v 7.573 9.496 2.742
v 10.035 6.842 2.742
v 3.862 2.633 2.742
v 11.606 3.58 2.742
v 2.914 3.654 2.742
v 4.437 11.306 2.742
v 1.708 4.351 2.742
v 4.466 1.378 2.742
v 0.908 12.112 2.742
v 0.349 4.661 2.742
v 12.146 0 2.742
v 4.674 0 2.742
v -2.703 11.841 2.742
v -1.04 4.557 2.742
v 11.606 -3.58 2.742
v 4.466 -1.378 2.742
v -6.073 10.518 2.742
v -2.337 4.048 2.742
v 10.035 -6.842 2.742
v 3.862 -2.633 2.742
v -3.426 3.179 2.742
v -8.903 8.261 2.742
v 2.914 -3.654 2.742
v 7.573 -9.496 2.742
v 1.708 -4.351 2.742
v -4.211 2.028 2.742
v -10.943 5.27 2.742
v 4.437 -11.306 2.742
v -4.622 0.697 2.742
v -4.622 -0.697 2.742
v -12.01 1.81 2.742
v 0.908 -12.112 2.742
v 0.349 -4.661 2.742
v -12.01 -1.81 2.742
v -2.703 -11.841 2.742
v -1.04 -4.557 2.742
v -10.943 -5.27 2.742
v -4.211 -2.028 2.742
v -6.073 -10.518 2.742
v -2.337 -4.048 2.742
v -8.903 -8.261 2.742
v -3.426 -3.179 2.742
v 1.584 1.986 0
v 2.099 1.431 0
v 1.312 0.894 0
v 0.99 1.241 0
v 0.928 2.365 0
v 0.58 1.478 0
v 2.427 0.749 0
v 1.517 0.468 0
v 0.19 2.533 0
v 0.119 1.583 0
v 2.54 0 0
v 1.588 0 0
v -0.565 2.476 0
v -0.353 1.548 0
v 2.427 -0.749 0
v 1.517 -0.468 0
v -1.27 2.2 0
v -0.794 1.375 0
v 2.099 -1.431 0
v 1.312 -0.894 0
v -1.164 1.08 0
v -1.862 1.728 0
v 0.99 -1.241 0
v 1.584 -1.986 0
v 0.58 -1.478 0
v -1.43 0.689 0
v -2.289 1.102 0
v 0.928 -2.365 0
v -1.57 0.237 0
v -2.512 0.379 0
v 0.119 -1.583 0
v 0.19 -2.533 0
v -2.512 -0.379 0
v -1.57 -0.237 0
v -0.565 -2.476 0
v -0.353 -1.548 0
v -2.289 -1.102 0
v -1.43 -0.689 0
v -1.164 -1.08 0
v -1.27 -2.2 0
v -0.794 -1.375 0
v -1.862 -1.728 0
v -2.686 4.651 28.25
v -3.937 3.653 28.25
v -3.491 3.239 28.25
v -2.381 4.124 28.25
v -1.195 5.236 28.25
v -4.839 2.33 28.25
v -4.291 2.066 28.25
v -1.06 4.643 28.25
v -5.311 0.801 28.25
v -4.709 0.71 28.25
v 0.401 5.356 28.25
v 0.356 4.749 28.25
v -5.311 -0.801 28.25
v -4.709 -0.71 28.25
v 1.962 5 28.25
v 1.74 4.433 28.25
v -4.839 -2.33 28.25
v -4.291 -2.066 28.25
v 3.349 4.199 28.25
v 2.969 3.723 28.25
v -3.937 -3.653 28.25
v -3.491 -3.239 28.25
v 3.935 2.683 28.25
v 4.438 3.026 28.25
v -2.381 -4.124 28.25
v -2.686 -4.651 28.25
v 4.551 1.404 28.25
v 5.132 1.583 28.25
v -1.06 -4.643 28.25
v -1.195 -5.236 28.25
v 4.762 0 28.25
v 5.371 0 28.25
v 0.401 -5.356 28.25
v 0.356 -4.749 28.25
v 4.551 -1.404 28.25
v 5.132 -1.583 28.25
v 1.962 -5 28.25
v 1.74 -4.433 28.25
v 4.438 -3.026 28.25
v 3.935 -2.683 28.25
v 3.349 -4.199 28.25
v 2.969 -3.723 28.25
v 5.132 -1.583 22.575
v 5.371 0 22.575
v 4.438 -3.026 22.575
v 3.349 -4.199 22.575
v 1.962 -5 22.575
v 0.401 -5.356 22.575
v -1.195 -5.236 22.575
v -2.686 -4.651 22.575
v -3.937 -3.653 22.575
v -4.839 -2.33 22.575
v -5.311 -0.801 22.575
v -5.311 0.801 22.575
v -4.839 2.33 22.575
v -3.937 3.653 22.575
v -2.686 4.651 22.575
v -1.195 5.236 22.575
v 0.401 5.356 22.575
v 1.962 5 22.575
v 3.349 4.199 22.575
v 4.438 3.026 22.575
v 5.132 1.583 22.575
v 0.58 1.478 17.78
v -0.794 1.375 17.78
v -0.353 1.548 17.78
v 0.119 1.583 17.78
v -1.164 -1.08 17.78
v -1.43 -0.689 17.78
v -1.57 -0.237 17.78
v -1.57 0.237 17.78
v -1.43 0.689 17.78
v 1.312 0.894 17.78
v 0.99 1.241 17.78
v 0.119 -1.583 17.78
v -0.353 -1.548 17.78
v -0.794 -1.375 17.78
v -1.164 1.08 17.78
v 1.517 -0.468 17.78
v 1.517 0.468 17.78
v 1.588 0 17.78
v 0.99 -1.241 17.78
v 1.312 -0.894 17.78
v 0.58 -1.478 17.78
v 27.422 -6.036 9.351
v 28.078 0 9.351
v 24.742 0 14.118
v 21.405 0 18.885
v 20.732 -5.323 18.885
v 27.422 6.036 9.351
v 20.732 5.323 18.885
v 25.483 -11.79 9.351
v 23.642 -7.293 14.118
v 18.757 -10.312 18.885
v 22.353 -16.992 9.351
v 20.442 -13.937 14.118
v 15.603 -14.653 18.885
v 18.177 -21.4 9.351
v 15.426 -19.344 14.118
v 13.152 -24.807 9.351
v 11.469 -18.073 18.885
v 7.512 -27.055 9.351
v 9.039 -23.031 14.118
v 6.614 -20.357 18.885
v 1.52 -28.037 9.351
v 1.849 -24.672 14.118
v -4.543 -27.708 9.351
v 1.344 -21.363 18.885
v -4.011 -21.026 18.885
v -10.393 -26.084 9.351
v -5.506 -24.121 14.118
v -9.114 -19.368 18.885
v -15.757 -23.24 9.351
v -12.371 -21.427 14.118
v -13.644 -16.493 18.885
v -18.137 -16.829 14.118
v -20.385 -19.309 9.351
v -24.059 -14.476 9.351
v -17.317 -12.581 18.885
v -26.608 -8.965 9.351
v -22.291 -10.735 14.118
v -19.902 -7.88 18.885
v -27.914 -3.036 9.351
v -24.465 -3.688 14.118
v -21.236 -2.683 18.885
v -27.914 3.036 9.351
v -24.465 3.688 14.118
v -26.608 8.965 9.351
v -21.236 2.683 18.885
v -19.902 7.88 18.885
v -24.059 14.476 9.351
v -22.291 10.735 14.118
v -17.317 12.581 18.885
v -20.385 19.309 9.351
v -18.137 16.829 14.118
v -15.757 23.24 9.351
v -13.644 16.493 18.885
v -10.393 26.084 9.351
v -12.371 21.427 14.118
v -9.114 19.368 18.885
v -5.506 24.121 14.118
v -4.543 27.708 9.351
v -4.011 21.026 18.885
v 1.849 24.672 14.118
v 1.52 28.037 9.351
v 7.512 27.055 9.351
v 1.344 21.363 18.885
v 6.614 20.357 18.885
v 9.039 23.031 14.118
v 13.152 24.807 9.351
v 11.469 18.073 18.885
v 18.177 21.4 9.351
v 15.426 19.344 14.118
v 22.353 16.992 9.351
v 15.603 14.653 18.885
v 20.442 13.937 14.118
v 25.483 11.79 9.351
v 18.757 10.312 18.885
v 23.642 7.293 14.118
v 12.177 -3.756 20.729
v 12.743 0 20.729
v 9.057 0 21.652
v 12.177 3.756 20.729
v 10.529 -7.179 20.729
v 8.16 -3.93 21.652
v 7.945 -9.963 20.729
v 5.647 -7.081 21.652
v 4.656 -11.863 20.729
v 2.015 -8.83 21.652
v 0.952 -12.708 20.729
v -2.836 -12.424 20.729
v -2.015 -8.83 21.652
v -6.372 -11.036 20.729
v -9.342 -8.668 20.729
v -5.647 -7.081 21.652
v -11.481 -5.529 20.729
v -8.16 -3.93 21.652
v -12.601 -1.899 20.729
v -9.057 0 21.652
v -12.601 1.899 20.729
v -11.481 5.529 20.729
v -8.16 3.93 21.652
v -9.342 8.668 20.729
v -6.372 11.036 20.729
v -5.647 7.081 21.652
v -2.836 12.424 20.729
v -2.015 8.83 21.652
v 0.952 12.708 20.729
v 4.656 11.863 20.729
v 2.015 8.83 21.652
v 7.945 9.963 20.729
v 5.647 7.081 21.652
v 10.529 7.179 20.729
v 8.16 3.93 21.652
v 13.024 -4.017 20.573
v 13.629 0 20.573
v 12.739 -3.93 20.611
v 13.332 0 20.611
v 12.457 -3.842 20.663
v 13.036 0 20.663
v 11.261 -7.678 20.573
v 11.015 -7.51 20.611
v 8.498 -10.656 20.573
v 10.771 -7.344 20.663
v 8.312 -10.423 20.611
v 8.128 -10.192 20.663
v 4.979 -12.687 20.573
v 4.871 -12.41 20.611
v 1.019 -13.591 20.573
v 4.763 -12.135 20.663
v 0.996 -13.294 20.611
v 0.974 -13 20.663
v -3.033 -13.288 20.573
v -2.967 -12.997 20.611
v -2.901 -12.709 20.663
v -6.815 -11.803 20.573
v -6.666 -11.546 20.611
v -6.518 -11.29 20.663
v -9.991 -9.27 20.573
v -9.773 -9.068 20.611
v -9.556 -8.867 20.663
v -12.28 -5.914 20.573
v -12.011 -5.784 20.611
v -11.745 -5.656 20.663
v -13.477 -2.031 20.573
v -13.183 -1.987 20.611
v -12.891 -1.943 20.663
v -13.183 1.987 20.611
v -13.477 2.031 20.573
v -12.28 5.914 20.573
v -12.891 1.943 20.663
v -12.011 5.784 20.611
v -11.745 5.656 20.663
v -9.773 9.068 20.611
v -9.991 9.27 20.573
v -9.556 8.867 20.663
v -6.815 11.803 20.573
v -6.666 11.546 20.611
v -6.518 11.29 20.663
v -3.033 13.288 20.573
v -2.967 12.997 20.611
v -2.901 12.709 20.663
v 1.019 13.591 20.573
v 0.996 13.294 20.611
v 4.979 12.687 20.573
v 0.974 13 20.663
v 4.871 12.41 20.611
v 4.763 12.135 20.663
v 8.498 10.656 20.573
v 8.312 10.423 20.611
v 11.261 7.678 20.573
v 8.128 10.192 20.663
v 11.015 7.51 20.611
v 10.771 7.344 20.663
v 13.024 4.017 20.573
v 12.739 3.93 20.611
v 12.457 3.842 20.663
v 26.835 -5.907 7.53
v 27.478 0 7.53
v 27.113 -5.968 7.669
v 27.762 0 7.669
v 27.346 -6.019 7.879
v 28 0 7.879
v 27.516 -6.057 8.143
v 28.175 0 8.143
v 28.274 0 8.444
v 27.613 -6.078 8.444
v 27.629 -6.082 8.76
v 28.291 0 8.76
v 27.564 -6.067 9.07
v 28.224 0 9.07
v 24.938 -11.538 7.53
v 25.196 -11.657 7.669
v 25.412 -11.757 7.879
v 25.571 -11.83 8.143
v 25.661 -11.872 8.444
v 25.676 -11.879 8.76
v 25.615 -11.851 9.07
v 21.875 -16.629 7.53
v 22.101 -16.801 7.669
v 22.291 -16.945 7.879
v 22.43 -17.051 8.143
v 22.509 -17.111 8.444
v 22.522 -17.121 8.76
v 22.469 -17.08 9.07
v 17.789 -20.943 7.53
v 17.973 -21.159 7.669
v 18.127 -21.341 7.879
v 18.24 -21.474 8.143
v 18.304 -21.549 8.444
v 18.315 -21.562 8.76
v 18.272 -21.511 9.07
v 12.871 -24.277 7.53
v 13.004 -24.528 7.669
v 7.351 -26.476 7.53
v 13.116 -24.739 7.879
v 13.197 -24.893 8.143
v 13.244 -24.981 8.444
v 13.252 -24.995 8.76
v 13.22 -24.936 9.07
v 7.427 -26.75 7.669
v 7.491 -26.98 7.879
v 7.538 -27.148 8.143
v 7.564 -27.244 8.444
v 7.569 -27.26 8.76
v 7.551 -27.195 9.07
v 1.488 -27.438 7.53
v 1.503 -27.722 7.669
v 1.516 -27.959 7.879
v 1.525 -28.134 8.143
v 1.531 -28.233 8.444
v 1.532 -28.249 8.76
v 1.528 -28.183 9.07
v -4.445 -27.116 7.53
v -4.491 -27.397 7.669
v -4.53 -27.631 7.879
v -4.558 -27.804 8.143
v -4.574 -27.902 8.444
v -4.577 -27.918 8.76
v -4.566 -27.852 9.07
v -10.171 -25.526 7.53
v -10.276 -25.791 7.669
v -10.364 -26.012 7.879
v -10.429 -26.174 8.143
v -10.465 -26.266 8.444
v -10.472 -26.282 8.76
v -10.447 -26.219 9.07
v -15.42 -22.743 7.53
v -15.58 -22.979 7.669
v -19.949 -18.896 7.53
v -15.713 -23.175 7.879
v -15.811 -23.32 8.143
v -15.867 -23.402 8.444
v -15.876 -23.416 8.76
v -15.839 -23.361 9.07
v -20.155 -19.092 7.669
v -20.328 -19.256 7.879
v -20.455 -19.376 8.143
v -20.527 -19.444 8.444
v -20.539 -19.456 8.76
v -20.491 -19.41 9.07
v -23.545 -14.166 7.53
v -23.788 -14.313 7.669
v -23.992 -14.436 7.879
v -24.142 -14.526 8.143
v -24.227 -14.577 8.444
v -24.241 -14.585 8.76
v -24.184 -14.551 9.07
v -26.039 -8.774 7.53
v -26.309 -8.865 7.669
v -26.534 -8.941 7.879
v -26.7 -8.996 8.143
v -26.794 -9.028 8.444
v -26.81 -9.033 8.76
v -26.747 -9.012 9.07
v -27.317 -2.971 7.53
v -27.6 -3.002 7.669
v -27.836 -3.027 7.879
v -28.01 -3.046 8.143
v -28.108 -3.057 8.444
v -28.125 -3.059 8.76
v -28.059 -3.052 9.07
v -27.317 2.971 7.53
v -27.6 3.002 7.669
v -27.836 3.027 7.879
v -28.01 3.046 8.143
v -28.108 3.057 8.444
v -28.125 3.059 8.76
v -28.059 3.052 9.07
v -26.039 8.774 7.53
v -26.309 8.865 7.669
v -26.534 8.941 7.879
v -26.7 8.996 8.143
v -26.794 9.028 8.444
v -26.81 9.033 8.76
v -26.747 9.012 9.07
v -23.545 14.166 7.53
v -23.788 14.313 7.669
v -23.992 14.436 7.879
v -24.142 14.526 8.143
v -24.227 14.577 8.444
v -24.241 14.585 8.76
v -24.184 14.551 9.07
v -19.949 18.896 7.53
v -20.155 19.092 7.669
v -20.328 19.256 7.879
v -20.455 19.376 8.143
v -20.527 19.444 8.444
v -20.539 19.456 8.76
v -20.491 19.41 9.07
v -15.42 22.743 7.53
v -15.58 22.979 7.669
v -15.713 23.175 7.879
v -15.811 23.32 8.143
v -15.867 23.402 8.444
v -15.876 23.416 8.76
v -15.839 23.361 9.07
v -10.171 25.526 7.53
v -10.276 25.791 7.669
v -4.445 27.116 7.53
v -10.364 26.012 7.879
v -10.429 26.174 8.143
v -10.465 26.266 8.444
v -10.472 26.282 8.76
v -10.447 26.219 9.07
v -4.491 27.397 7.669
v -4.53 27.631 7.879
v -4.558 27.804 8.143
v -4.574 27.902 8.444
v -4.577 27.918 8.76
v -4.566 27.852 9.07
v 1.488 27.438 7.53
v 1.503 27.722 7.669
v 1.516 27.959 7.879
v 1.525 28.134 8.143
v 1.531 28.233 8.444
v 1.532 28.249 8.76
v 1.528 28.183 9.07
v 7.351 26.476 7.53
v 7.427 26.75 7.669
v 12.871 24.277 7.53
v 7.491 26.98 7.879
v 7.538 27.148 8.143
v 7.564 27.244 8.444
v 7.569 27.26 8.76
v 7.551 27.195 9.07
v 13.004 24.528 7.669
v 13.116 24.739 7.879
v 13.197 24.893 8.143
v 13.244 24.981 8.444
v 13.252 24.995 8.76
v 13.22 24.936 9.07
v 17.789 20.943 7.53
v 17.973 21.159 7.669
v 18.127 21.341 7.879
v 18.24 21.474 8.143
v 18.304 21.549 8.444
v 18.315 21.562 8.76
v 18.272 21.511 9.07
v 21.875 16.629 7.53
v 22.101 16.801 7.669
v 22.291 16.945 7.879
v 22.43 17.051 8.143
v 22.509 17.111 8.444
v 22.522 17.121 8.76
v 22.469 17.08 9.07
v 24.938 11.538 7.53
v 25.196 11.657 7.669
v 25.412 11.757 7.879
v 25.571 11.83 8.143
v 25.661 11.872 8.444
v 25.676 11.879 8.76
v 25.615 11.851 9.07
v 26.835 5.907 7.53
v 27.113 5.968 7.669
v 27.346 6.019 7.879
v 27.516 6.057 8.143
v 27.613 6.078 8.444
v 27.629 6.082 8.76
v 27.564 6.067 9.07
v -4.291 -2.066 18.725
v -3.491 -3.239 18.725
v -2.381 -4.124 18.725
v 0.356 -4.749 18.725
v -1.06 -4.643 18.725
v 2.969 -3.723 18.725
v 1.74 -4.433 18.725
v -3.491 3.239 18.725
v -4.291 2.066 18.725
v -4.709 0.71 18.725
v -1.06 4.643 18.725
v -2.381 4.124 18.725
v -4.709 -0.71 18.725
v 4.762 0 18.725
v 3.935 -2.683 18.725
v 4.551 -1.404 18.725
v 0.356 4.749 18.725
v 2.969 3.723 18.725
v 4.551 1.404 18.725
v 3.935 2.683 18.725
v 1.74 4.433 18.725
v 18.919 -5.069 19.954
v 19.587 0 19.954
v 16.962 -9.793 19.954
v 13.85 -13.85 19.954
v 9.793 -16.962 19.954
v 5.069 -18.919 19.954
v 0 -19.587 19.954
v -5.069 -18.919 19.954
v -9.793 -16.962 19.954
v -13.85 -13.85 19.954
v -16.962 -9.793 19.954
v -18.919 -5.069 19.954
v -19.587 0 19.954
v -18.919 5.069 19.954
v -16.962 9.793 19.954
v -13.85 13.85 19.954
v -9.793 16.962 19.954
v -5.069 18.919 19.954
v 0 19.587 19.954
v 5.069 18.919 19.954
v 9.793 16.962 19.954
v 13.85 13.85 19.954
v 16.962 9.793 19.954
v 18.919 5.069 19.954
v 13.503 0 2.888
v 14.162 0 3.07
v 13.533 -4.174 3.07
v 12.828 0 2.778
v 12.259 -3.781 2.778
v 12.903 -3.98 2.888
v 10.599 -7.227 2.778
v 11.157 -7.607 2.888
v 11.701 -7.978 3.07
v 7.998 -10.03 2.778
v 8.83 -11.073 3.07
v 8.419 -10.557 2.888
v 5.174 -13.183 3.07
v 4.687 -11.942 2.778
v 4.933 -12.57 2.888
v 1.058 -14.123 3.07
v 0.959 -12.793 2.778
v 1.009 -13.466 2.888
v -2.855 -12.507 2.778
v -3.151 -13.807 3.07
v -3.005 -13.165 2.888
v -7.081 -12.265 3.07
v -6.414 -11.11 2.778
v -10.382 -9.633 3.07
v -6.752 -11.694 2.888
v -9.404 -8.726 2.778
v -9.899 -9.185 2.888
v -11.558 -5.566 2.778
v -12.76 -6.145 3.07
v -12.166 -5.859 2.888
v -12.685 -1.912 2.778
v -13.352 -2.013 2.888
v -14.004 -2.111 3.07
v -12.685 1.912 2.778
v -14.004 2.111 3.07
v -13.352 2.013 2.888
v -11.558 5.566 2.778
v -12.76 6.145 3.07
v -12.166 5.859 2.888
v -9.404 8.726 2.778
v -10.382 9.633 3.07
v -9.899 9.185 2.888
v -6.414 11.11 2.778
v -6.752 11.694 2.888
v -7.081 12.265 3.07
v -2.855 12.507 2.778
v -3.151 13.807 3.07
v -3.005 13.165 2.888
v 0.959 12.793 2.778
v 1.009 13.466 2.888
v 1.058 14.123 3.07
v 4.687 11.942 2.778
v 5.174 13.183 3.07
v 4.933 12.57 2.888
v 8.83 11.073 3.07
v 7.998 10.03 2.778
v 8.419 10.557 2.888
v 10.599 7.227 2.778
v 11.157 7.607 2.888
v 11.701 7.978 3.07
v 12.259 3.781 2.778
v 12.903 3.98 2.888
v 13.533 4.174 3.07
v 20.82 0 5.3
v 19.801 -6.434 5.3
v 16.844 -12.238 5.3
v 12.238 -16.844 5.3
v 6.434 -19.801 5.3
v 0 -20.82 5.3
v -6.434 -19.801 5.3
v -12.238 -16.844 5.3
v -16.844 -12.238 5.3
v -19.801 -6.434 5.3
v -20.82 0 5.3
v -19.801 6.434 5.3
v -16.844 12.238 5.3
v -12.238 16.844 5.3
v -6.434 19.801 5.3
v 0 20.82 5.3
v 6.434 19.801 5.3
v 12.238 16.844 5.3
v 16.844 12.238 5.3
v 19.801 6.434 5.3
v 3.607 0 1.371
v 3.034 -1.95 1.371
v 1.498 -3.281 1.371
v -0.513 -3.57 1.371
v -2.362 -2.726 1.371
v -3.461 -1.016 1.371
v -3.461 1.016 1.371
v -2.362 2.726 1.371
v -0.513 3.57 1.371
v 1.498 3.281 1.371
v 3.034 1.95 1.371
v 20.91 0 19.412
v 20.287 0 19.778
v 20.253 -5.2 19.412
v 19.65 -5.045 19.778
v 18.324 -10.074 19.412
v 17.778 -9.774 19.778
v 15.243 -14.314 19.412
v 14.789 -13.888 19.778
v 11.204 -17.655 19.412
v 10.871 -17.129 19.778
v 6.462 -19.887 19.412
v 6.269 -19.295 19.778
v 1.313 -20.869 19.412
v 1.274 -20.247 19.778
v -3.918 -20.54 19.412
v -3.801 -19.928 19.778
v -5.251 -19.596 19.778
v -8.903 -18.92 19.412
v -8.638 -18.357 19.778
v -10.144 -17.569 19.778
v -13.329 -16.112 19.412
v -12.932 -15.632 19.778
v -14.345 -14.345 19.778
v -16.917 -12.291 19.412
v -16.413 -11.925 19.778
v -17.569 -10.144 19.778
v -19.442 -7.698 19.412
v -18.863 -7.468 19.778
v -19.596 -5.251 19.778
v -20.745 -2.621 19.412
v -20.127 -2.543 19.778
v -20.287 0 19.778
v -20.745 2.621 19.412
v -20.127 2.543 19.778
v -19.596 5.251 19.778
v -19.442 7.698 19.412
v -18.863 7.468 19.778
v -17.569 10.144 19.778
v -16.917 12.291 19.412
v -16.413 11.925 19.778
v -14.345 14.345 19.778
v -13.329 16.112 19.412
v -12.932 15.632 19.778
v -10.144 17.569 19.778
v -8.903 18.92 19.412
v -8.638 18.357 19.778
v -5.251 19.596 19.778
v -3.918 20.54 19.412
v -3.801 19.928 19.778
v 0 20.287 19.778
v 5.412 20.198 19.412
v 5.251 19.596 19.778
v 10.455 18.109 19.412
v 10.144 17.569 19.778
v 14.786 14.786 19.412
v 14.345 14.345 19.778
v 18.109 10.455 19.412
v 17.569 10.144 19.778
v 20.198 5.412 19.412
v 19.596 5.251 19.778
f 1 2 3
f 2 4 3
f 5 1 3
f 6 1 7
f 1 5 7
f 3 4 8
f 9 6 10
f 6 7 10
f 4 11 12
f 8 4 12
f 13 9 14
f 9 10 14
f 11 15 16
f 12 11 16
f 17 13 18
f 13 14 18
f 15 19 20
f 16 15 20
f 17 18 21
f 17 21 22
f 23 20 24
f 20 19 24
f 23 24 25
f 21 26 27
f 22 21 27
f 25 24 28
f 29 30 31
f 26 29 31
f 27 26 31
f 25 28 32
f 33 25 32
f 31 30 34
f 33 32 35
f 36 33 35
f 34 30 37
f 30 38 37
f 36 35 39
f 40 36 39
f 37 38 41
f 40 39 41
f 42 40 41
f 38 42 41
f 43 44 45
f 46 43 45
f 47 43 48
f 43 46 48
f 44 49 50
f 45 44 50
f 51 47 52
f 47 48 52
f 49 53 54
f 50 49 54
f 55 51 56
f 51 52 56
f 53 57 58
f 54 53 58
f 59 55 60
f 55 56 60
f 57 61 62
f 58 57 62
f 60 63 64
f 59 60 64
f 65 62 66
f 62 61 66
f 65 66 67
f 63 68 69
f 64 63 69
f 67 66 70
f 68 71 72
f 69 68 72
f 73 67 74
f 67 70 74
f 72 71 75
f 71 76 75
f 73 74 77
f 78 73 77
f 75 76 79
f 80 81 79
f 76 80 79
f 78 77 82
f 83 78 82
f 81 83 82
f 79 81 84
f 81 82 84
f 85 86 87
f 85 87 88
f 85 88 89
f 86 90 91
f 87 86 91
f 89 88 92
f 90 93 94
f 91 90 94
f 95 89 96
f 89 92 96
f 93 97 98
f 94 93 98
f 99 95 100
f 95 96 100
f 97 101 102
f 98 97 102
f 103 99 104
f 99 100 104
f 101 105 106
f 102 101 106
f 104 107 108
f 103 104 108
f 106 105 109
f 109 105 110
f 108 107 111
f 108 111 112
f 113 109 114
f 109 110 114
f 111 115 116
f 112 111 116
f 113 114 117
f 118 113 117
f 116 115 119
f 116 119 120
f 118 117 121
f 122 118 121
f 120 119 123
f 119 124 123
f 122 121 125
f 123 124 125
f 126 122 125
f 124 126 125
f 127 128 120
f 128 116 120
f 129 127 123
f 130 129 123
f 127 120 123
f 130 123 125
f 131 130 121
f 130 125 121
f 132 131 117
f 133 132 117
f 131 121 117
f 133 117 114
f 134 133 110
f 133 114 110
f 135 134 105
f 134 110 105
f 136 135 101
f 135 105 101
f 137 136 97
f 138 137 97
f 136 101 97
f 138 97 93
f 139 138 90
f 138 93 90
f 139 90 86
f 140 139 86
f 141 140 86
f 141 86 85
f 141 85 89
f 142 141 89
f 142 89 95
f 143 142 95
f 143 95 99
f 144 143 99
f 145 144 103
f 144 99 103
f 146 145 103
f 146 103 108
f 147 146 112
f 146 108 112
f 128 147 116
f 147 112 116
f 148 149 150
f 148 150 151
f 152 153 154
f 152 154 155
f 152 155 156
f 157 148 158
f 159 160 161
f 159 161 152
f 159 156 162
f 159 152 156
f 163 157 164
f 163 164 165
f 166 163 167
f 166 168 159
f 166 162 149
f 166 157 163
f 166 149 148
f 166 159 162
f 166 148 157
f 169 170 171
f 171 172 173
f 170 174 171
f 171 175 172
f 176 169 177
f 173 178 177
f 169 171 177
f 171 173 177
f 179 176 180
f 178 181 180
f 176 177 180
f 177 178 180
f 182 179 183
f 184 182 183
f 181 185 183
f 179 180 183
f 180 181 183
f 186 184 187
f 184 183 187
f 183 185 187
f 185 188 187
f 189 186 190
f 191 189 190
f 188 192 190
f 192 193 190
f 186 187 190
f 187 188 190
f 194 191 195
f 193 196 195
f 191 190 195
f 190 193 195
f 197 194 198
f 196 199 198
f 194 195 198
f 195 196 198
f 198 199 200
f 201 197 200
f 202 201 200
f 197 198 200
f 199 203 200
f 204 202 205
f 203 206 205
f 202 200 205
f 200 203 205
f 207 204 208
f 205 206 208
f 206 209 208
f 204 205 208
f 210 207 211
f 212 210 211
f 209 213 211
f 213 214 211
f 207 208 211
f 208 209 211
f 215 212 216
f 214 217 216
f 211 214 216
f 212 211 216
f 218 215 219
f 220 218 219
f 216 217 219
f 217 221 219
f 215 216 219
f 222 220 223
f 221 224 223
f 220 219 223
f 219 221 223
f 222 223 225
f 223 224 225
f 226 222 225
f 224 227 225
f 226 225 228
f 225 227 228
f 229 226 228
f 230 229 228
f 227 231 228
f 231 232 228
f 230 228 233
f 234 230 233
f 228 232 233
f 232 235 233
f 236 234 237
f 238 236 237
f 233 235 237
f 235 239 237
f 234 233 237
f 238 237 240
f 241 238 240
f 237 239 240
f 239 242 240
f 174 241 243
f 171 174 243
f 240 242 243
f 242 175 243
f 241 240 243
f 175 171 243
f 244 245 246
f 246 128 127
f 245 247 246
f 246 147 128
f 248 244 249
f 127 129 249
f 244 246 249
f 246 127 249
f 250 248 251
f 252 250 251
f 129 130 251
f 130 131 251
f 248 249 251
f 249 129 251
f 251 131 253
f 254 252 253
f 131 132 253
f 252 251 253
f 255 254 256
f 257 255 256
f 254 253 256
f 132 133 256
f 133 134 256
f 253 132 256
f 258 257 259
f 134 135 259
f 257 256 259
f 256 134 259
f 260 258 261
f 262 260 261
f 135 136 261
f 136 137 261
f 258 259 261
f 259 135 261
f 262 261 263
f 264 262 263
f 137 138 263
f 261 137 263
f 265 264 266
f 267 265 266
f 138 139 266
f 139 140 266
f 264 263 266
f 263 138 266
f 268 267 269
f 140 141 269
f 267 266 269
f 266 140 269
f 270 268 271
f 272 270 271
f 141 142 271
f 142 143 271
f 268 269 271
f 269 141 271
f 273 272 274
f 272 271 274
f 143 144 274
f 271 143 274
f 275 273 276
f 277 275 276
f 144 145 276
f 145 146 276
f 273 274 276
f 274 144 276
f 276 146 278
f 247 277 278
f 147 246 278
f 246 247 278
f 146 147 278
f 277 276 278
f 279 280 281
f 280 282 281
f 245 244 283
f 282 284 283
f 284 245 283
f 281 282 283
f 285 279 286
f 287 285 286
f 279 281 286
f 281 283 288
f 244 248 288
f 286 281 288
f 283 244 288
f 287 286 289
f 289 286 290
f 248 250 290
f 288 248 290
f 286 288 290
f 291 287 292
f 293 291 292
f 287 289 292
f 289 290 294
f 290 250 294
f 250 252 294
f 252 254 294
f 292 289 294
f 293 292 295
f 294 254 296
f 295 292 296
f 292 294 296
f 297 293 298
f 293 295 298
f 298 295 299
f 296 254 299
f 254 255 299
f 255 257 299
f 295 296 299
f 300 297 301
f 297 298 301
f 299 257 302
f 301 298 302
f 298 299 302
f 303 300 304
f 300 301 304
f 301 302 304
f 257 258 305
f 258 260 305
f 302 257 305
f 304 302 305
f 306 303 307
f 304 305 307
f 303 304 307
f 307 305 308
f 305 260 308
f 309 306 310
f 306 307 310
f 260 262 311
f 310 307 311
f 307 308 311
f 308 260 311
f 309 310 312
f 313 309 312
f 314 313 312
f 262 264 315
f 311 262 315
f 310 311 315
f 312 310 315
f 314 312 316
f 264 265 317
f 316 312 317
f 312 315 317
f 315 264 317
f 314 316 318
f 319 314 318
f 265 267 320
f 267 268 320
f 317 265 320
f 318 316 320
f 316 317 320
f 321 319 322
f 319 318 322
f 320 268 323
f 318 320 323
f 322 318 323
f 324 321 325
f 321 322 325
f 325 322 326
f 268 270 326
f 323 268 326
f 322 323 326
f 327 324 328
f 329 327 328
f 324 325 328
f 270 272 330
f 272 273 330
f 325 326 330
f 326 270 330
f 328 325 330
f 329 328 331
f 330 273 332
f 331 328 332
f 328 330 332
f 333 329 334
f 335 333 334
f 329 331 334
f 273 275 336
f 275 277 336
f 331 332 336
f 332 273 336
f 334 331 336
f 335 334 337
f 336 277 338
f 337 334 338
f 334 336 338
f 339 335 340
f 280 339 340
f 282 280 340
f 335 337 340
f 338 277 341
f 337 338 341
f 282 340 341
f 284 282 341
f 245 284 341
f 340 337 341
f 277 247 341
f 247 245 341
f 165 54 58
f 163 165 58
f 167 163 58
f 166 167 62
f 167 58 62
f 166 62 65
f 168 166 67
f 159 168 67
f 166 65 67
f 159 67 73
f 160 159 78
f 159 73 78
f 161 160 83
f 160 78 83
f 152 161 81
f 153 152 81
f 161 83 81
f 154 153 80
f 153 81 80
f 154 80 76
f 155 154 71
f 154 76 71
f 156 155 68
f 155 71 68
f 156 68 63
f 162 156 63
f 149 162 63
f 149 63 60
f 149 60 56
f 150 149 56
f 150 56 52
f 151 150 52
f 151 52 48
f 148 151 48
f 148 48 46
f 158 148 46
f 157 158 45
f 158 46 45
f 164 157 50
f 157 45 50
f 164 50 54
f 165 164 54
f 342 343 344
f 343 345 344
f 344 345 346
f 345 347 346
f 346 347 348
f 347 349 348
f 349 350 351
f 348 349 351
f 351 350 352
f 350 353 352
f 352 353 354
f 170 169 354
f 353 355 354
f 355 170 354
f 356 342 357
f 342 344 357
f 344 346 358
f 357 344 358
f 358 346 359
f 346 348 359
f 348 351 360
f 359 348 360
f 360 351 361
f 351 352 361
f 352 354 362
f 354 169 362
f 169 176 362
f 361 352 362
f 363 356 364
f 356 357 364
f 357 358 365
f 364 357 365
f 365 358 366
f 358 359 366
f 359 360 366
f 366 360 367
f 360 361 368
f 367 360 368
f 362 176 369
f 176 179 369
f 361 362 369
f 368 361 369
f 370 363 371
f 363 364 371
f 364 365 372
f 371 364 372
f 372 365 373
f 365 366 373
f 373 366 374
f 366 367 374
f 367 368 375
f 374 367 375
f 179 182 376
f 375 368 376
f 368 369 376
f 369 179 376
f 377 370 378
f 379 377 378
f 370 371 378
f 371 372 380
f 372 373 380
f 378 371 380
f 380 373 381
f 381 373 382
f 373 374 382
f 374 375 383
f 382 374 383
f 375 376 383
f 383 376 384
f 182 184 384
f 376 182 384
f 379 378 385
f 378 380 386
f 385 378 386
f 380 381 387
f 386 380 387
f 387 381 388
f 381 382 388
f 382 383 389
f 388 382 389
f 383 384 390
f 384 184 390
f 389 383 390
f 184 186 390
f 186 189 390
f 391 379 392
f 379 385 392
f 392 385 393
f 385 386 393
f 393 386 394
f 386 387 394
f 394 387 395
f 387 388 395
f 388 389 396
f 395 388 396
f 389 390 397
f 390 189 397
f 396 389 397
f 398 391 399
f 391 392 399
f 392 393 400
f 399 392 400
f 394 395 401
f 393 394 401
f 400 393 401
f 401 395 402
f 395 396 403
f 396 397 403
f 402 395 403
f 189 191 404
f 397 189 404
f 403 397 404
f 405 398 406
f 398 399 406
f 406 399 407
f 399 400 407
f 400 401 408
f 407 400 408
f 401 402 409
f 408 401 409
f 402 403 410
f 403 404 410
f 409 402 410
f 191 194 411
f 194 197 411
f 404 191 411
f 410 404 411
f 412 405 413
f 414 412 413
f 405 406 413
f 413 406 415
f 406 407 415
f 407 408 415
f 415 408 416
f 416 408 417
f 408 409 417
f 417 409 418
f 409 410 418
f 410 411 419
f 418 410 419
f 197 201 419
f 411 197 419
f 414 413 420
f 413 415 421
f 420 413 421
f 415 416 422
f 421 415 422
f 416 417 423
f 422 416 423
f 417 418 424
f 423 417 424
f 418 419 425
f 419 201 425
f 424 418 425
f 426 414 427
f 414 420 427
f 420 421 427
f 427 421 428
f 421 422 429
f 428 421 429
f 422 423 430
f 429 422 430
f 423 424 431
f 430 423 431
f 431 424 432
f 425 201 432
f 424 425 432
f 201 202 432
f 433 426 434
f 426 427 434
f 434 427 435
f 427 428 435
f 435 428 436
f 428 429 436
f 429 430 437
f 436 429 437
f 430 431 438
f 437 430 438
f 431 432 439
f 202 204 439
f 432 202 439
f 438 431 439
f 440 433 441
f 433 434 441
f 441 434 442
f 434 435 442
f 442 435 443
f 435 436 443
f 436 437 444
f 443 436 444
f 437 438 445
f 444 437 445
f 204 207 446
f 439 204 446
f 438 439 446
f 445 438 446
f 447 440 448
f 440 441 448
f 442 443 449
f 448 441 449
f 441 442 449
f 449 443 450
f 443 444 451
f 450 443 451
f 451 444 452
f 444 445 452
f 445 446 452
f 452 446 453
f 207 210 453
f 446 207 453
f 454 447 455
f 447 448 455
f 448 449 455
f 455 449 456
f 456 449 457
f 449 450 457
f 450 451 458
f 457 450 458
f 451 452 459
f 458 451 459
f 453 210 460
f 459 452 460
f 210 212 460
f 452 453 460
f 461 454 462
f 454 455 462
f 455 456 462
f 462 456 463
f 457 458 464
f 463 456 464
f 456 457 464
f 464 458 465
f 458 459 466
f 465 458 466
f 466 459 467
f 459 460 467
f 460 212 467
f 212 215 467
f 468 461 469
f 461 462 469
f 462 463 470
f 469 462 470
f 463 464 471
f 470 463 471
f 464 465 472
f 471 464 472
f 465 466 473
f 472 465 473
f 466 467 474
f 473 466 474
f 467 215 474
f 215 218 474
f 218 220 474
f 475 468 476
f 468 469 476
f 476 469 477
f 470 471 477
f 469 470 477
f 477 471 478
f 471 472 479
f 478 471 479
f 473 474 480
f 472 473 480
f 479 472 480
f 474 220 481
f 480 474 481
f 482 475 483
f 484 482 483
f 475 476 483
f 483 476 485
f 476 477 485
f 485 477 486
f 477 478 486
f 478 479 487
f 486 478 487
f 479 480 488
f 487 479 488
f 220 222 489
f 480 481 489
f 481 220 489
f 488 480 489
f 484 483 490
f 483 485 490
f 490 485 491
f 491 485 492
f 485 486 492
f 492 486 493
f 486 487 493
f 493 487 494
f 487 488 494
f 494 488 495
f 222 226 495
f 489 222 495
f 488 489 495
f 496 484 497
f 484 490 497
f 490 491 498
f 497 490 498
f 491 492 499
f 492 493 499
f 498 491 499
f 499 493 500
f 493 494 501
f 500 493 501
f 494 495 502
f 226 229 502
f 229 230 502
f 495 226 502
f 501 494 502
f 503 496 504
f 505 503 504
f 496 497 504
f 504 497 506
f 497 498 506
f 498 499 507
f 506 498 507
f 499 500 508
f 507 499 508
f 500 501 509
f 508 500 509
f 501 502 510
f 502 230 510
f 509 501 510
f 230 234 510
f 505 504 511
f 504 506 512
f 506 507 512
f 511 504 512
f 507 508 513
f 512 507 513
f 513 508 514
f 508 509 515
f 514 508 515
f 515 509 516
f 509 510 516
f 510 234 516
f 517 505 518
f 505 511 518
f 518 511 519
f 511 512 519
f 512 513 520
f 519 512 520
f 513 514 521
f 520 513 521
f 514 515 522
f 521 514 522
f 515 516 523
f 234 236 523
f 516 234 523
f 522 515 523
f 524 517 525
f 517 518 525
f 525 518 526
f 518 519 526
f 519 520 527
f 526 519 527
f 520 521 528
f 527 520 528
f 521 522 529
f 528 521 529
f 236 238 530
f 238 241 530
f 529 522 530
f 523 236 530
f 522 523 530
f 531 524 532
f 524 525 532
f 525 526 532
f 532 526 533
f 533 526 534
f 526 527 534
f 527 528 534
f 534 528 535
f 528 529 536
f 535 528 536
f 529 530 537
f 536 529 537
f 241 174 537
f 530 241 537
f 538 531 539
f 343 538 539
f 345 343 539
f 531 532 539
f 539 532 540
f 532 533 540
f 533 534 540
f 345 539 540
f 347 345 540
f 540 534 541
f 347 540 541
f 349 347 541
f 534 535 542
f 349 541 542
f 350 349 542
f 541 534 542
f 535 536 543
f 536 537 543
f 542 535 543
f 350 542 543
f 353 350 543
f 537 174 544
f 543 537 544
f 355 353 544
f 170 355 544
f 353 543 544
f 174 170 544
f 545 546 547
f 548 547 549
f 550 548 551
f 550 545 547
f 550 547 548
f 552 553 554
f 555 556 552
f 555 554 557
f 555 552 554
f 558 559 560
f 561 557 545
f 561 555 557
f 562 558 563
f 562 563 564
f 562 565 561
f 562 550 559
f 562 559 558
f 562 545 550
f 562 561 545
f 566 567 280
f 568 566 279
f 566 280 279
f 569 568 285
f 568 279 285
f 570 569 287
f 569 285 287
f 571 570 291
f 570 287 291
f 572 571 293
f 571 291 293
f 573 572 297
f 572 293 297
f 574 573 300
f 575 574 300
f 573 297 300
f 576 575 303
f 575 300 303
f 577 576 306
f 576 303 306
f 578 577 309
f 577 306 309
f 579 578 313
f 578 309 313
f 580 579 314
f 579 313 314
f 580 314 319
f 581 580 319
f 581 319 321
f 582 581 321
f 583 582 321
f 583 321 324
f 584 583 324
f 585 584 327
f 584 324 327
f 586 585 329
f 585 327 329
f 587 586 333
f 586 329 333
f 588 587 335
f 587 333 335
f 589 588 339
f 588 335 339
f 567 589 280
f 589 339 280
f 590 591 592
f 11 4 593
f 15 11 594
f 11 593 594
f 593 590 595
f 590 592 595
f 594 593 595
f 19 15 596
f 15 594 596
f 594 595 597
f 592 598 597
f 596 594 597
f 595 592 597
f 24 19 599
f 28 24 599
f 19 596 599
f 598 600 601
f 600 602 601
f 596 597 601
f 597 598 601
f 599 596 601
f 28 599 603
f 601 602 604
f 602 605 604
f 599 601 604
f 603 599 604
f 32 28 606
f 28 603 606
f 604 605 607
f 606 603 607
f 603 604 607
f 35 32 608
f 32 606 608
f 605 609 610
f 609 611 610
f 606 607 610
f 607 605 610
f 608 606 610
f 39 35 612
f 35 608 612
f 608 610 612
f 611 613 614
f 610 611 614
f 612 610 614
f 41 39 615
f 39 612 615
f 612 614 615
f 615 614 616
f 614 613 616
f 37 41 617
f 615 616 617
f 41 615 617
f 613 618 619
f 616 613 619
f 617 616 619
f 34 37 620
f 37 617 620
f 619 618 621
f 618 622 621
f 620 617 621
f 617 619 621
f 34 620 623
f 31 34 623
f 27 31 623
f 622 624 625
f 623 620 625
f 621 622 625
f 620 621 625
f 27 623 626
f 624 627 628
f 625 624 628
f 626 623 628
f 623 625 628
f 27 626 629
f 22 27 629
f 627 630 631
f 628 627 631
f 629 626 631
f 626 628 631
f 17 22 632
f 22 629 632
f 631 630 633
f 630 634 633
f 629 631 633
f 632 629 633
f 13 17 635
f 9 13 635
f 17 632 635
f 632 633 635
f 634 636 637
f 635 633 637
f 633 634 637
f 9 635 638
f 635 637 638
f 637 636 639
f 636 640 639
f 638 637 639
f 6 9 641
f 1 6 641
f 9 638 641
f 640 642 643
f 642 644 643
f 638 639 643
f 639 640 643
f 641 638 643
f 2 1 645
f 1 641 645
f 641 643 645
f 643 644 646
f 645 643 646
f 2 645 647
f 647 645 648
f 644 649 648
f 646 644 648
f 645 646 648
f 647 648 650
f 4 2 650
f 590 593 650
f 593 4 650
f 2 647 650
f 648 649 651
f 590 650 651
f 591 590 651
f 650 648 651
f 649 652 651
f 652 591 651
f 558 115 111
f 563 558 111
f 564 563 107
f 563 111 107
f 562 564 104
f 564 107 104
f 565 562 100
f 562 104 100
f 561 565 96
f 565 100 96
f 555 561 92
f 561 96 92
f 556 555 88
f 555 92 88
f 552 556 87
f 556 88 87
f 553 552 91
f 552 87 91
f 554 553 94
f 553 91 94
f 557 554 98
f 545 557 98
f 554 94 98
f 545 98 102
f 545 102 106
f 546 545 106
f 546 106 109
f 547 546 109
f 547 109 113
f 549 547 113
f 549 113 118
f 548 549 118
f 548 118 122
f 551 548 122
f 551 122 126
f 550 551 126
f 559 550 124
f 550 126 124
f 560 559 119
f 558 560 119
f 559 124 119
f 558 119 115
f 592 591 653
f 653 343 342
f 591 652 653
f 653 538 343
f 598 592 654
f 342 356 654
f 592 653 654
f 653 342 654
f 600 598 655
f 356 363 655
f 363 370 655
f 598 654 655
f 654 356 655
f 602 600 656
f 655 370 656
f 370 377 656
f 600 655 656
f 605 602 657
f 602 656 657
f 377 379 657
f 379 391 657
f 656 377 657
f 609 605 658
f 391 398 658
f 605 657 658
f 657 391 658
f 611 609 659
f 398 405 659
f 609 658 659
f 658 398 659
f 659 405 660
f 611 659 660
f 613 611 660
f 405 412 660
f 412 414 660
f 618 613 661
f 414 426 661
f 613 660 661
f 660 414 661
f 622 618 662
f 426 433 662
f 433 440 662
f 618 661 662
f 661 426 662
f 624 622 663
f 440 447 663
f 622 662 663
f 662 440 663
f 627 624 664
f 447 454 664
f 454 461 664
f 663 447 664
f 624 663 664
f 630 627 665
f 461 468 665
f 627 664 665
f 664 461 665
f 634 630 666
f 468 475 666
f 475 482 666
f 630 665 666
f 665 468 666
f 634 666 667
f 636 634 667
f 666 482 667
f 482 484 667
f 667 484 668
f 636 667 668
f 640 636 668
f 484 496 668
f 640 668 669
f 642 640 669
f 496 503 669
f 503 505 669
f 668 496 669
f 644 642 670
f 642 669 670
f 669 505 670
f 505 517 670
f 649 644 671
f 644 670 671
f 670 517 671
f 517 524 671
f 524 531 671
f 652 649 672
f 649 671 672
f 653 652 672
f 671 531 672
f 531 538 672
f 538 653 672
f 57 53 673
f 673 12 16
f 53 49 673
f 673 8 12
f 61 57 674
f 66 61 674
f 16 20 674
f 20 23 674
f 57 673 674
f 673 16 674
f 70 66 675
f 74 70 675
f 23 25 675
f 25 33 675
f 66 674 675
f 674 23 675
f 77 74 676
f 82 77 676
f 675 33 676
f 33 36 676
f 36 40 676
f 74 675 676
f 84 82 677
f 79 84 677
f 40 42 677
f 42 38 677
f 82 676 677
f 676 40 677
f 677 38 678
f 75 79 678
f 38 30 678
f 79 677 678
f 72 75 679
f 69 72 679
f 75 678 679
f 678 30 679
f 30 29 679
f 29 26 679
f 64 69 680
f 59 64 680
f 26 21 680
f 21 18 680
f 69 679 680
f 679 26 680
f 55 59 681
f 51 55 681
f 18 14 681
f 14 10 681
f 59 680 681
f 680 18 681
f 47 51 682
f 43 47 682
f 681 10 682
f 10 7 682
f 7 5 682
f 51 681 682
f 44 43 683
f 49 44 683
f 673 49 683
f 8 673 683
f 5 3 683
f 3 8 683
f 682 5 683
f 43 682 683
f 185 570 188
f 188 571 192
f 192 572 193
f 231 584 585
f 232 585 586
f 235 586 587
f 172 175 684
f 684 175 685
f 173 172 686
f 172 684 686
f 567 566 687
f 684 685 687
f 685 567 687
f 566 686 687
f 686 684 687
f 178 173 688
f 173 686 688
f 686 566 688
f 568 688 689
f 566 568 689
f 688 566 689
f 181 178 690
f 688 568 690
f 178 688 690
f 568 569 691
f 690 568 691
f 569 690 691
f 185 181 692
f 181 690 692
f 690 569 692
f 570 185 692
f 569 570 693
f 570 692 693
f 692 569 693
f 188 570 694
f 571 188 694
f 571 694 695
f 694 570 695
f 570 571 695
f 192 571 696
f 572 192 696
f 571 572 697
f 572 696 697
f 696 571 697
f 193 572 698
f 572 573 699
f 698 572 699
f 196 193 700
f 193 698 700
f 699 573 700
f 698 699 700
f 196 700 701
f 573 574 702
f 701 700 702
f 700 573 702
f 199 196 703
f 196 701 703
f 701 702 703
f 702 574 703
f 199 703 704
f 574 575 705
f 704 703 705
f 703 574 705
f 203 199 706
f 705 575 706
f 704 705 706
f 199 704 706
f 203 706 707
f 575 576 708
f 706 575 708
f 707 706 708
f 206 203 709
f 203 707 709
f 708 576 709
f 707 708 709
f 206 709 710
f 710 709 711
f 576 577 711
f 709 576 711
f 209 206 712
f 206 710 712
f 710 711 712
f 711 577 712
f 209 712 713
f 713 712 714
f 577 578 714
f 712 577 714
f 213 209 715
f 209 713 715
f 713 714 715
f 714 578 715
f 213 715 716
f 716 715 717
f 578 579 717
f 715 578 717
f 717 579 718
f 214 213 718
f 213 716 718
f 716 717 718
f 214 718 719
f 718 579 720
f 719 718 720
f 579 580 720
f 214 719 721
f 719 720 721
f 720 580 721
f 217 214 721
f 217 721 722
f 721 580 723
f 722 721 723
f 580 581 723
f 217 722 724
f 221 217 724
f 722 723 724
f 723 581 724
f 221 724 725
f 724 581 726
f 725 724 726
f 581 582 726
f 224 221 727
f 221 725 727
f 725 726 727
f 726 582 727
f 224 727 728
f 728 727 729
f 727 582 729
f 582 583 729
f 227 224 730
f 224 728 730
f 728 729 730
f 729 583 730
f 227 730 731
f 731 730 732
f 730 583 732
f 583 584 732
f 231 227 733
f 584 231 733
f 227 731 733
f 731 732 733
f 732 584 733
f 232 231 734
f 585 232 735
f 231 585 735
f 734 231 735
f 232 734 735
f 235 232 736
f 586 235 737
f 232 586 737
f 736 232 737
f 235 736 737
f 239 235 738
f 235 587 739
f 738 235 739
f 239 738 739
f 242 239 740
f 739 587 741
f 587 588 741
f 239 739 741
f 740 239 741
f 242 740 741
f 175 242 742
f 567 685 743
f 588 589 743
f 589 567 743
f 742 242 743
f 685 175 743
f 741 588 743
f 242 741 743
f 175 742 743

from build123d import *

# Parameters (mm, degrees)
F2_R     = 4.7625
F3_DEPTH = 9.525
F4_R     = 1.5875
F5_DEPTH = 17.78


with BuildPart() as f1:
    # F0 (on Front) → F1 (revolve)
    with BuildSketch(Plane.XZ):
        with BuildLine():
            Line((12.743474, 20.729434), (5.371063, 22.575061))
            Line((5.371063, 22.575061), (5.371063, 28.250467))
            Line((5.371063, 28.250467), (0, 28.250467))
            Line((0, 28.250467), (0, 0))
            Line((0, 0), (2.540102, 0))
            Line((2.540102, 0), (4.674008, 2.74161))
            Line((4.674008, 2.74161), (12.14571, 2.74161))
            ThreePointArc((12.14571, 2.74161), (13.167332, 2.824331), (14.162337, 3.070338))
            Line((14.162337, 3.070338), (27.477805, 7.529916))
            ThreePointArc((27.477805, 7.529916), (28.234492, 8.290196), (28.078277, 9.351419))
            Line((28.078277, 9.351419), (21.404842, 18.884539))
            ThreePointArc((21.404842, 18.884539), (20.61201, 19.617126), (19.586547, 19.954304))
            Line((19.586547, 19.954304), (13.62924, 20.573351))
            ThreePointArc((13.62924, 20.573351), (13.18359, 20.63569), (12.743474, 20.729434))
        make_face()
    revolve(axis=Axis((0, 0, 14.125234), (0, 0, -1)))

    # F2 (on face) → F3 (cut)
    with BuildSketch(Plane.XY.offset(28.250467)):
        Circle(F2_R)
    extrude(amount=-F3_DEPTH, mode=Mode.SUBTRACT)

    # F4 (on face) → F5 (cut)
    with BuildSketch(Plane(origin=(0, 0, 0), x_dir=(1, 0, 0), z_dir=(0, 0, -1))):
        Circle(F4_R)
    extrude(amount=-F5_DEPTH, mode=Mode.SUBTRACT)


solid = f1.part
